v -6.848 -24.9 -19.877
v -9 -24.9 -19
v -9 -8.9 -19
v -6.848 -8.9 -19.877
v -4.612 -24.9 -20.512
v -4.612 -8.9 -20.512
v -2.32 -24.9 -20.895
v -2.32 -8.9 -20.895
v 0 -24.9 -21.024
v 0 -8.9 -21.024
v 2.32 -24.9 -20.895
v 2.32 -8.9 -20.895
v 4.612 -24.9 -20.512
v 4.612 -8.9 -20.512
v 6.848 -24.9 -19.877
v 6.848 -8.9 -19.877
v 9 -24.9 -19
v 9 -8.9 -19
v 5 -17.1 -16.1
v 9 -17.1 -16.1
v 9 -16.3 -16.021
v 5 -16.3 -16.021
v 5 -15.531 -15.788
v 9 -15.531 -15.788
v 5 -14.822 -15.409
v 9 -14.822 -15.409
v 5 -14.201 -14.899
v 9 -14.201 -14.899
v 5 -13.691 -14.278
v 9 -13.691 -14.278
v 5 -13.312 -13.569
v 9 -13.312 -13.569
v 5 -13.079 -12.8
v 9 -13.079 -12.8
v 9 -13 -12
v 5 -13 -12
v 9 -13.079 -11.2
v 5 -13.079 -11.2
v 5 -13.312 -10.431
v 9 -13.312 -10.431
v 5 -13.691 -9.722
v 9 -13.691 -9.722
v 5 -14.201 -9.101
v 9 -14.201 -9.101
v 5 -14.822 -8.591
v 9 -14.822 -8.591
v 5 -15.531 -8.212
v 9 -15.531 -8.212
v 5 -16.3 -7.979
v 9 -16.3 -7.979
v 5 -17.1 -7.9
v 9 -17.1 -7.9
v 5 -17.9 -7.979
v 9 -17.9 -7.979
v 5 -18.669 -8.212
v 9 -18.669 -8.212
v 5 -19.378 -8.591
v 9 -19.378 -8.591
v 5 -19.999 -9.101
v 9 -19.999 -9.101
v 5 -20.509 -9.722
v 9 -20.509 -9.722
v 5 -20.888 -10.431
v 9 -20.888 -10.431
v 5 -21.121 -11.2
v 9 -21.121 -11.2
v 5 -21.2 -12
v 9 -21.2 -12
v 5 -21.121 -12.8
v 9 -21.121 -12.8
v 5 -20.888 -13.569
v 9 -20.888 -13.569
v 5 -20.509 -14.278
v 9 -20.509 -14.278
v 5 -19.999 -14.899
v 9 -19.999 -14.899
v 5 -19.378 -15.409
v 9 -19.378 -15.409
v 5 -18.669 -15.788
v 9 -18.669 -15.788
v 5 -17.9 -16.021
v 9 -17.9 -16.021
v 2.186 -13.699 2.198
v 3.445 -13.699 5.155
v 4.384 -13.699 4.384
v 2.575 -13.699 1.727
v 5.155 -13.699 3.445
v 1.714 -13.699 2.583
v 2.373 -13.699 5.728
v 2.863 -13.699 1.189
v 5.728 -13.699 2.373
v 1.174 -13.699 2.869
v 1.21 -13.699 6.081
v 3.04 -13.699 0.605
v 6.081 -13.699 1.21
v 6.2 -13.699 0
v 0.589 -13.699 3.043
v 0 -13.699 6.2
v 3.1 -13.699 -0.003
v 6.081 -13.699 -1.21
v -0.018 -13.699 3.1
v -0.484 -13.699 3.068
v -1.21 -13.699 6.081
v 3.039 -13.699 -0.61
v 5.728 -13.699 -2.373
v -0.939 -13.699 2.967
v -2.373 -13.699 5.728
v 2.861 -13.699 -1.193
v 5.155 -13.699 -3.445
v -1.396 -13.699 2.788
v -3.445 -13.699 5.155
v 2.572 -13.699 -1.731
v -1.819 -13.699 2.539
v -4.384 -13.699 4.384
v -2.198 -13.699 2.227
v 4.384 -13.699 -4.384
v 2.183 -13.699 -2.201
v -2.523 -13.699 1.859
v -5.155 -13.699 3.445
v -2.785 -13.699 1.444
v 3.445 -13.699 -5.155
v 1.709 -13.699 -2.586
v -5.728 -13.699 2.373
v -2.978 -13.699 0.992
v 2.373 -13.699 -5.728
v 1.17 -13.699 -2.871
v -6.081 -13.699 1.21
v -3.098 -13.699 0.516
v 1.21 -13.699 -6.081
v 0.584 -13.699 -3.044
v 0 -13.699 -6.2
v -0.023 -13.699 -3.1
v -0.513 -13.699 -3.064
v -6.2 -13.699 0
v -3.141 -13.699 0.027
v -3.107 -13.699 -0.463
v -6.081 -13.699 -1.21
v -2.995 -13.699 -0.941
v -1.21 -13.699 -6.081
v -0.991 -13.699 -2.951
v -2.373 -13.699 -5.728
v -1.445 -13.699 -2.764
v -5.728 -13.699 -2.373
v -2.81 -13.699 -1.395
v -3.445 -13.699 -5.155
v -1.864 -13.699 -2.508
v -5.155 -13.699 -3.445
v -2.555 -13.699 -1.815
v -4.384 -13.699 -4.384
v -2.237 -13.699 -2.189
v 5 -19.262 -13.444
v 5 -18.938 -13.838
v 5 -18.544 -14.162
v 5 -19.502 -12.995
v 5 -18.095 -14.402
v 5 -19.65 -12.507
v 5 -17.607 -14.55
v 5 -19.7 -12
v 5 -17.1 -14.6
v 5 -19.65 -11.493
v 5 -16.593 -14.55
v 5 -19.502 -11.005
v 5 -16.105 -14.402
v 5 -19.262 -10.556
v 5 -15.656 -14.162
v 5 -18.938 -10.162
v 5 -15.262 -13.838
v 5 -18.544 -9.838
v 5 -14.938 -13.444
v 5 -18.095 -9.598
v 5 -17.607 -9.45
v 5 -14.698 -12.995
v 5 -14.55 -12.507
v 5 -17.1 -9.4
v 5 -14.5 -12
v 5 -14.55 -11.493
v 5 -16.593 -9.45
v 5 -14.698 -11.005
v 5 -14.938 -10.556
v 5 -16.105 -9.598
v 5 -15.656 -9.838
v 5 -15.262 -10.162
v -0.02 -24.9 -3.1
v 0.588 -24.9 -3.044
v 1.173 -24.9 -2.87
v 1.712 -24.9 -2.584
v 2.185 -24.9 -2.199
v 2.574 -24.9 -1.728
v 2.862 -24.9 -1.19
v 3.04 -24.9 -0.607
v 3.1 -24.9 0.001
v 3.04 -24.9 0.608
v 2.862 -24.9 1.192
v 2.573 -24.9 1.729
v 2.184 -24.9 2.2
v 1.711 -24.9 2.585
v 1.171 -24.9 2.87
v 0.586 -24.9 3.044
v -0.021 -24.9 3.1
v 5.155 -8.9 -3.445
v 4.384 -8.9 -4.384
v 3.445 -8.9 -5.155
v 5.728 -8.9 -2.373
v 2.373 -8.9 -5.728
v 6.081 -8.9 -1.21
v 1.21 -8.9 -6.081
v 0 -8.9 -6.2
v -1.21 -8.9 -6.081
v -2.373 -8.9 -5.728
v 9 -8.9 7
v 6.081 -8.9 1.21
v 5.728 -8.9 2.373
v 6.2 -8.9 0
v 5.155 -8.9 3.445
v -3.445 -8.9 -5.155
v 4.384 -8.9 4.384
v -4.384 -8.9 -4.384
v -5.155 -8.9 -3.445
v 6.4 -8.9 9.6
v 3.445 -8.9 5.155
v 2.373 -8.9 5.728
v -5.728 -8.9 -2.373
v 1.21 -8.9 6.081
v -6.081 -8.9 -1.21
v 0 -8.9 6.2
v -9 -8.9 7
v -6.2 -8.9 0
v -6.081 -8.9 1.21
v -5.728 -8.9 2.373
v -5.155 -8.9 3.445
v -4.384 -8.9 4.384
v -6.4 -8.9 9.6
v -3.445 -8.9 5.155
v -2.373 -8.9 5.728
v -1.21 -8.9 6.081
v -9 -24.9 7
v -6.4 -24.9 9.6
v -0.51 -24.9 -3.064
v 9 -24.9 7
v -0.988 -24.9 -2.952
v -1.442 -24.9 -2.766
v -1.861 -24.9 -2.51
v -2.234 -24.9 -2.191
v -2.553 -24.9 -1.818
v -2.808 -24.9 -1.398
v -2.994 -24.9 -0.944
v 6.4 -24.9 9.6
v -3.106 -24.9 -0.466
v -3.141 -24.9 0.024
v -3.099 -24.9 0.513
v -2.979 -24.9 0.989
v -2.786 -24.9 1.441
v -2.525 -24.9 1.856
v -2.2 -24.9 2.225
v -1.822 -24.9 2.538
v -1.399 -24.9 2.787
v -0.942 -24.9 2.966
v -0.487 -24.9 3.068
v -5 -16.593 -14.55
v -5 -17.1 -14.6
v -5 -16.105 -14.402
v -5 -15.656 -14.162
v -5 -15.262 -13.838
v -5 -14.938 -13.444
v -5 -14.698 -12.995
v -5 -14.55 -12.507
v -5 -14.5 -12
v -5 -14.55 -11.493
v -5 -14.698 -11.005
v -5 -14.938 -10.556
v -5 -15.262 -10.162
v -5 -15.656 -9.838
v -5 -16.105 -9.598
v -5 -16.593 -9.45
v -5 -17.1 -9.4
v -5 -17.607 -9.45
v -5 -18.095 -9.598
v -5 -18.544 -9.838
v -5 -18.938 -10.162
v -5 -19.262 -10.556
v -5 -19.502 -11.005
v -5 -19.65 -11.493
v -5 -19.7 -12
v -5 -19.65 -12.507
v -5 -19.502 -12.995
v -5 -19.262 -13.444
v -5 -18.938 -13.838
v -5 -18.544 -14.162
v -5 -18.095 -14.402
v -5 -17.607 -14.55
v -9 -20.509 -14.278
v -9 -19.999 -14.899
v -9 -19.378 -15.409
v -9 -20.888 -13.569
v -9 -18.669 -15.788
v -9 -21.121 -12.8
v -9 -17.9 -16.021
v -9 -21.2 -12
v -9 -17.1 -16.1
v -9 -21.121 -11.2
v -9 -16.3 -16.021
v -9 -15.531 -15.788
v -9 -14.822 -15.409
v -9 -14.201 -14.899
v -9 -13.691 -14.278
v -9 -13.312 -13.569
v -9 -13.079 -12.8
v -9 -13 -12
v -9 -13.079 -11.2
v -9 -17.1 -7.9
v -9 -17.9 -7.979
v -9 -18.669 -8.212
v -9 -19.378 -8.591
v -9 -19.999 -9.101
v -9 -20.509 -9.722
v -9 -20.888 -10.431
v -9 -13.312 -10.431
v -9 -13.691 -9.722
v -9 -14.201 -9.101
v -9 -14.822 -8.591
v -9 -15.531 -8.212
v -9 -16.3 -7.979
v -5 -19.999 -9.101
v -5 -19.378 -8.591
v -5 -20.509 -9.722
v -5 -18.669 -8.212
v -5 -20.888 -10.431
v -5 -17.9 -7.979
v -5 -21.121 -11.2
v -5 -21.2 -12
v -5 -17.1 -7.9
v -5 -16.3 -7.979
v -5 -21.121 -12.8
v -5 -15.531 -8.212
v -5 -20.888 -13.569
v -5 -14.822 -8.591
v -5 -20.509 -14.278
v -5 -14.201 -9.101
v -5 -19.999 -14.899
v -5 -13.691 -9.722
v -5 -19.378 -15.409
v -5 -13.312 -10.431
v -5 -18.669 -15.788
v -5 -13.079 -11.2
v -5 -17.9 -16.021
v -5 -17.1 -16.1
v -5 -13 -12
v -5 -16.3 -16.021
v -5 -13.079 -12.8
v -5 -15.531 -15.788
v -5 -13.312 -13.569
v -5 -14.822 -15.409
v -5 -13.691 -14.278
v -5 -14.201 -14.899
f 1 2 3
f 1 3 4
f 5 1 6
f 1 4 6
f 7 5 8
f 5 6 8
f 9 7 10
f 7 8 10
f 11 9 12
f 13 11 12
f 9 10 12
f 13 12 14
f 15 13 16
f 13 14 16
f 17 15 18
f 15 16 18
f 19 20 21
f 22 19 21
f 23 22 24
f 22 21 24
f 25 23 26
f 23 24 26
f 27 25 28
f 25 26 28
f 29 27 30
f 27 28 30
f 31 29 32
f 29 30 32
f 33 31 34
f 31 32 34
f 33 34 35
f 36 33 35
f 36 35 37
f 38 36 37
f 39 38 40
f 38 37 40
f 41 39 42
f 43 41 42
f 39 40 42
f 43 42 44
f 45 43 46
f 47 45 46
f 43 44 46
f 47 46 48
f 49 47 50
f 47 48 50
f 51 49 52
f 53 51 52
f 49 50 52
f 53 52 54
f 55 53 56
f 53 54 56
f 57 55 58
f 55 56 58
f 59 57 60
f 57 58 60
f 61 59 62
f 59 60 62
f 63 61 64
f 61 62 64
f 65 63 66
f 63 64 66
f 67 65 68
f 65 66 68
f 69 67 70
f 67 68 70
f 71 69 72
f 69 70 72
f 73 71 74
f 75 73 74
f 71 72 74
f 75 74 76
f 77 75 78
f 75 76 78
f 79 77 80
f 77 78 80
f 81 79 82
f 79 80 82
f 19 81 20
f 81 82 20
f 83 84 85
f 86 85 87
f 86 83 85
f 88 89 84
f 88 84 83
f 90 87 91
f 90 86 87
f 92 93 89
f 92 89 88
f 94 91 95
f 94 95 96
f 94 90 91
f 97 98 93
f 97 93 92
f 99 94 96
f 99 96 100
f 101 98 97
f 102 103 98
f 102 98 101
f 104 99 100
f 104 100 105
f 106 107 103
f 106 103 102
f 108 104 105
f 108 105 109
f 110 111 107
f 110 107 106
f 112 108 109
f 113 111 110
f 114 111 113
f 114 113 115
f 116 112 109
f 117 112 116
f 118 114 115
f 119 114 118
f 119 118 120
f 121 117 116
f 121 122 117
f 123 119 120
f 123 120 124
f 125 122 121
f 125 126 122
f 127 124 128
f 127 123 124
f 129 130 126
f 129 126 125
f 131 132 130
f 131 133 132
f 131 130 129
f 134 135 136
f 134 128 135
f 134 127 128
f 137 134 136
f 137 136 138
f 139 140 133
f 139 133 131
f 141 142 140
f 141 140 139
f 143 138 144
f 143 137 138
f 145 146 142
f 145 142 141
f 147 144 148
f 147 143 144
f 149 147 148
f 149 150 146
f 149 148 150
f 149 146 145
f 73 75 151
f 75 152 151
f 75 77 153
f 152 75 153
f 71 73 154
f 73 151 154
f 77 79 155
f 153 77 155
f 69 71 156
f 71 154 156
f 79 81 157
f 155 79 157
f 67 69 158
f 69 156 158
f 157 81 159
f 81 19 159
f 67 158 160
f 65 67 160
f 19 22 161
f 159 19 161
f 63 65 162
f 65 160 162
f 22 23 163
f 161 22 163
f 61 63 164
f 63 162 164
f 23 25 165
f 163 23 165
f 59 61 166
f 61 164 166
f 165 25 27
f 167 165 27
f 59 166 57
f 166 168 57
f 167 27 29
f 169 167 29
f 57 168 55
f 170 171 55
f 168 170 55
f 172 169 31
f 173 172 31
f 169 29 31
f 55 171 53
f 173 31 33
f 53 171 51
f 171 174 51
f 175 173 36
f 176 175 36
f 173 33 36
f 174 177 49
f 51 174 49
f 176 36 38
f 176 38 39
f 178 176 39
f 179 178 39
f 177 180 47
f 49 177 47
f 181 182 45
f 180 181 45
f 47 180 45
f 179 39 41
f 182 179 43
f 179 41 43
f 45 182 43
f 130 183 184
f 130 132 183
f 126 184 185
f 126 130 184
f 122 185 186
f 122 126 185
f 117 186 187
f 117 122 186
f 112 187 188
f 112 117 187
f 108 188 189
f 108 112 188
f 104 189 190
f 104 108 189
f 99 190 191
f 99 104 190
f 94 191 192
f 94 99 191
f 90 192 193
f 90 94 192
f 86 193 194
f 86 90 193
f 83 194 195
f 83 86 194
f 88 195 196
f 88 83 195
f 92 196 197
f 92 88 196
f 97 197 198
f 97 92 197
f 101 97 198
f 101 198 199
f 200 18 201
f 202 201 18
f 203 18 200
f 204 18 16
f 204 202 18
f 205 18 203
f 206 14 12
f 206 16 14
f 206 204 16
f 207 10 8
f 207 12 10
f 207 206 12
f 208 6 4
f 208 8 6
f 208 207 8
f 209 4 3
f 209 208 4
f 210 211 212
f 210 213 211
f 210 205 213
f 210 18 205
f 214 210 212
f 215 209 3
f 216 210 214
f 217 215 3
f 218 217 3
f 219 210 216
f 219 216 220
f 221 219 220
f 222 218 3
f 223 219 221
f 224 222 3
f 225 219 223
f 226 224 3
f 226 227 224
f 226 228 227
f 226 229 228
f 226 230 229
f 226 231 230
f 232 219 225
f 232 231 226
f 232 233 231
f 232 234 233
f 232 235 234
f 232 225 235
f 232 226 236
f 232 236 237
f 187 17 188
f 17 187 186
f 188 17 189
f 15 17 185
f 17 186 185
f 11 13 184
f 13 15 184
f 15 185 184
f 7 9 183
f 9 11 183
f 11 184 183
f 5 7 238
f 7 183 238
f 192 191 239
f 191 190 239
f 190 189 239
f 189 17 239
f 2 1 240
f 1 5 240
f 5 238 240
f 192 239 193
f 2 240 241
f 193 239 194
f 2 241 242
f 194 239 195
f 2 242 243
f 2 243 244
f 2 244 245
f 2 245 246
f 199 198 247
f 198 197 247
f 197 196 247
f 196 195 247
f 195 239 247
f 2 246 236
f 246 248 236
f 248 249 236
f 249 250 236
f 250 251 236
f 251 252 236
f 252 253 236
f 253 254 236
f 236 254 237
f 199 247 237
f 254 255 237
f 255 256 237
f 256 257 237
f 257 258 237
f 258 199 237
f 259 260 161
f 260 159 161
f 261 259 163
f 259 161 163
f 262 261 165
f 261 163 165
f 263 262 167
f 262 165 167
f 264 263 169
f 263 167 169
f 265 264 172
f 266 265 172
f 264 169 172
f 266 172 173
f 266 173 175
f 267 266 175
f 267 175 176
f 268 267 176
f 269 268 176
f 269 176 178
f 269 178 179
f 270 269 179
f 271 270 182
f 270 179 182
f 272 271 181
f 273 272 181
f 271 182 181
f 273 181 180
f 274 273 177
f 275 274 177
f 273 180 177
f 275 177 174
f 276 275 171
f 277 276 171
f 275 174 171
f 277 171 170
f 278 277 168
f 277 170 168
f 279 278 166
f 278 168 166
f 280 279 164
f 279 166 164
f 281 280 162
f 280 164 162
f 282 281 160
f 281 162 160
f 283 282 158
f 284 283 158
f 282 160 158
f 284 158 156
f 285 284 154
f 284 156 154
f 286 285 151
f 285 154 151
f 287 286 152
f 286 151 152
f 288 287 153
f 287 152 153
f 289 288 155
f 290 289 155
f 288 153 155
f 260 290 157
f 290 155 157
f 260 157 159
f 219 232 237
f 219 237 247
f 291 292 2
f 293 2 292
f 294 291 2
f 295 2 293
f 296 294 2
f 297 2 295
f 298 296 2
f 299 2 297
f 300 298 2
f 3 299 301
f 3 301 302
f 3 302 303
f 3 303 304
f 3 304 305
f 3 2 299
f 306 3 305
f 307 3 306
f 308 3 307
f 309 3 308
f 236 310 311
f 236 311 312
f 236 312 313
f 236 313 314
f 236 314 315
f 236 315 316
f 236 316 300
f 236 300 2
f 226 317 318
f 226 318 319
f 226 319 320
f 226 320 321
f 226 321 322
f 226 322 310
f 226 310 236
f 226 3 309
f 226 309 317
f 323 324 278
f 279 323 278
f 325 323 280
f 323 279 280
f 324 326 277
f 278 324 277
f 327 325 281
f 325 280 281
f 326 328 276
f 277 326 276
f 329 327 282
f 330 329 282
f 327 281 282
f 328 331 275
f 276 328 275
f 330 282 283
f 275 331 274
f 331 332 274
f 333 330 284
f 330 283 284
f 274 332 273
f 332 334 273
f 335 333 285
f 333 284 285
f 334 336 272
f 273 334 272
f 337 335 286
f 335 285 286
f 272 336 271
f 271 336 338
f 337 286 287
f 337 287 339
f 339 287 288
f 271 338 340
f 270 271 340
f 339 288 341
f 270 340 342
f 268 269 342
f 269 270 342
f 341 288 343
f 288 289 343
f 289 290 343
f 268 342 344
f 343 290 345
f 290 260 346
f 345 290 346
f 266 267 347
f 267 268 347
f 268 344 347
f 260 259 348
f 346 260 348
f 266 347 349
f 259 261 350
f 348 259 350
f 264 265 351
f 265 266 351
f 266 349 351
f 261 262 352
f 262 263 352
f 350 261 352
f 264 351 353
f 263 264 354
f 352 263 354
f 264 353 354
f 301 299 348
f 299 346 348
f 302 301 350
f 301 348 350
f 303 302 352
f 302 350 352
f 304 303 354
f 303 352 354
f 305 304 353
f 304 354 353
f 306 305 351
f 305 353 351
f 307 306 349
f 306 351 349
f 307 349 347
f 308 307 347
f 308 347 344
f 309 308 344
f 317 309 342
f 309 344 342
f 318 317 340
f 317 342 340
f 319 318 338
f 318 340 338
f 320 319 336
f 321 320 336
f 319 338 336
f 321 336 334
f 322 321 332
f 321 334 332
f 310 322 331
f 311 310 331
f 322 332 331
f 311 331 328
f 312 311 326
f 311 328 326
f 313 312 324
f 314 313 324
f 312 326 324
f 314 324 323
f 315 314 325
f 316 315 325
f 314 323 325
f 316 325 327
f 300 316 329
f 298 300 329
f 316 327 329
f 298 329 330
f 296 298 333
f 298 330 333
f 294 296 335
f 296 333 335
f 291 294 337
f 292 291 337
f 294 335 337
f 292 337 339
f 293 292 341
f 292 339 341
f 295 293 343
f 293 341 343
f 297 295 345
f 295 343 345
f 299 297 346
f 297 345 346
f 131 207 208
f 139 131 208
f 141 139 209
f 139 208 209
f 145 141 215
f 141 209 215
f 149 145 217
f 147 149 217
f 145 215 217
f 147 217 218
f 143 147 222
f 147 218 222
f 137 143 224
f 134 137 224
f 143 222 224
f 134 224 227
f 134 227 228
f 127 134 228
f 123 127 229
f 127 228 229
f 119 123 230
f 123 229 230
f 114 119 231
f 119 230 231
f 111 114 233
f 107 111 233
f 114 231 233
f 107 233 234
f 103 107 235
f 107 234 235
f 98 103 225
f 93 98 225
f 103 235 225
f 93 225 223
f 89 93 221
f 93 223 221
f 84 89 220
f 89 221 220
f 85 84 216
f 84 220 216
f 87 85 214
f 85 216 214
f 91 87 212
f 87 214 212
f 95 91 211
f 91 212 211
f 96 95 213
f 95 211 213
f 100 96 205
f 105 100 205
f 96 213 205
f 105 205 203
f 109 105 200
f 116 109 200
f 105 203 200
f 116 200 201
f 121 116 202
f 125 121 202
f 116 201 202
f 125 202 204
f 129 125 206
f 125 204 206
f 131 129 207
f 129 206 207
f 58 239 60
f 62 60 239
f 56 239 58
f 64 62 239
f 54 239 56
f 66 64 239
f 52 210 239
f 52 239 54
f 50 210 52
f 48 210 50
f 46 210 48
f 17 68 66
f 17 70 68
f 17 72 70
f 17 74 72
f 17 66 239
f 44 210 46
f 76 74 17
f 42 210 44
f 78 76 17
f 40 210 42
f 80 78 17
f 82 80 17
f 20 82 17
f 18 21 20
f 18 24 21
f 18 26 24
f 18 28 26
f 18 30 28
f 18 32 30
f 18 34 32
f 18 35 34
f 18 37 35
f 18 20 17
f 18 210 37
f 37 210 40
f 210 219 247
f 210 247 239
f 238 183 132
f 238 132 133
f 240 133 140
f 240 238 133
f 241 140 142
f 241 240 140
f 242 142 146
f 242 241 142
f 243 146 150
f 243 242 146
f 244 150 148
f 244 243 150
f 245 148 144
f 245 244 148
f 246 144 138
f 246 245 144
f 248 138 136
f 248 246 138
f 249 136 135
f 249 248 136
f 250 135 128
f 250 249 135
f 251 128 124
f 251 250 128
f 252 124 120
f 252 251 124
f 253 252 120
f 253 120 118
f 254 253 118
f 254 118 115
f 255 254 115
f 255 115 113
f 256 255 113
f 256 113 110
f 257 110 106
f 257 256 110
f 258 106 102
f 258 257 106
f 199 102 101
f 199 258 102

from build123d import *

# Parameters (mm, degrees)
COPYSKETCH018_W             = 6.8
COPYSKETCH018_H             = 3.7
CYLINDER069_R               = 3.1
CYLINDER069_DEPTH           = 44
CYLINDER069_ROLL_ANGLE      = -89.999777
CYLINDER069_PITCH_ANGLE     = -2.5e-05
CYLINDER069_PLACEMENT_ANGLE = 7.5e-05
SKETCH022_R                 = 3.1
PAD022_DEPTH                = 16


with BuildPart() as abstand_ring004:
    # CopySketch018 → Revolution004 (revolve)
    with BuildSketch(Plane.YZ):
        with Locations((-5.899207, -4.35)):
            Rectangle(COPYSKETCH018_W, COPYSKETCH018_H)
    revolve(axis=Axis((0, 0, 0), (0, 1, 0)))


with BuildPart() as abstand_ring004_1:
    # Body032 placement: moved
    add(abstand_ring004.part.moved(Location((0, -4.4, 0))))


with BuildPart() as bohrung_durch_innen:
    # Cylinder069 → Cylinder069 (new body)
    with BuildSketch(Plane.XY):
        Circle(CYLINDER069_R)
    extrude(amount=CYLINDER069_DEPTH)


with BuildPart() as bohrung_durch_innen_1:
    # Cylinder069 roll: moved
    add(bohrung_durch_innen.part.rotate(Axis((0, 0, 0), (1, 0, 0)), CYLINDER069_ROLL_ANGLE))


with BuildPart() as bohrung_durch_innen_2:
    # Cylinder069 pitch: moved
    add(bohrung_durch_innen_1.part.rotate(Axis((0, 0, 0), (0, 1, 0)), CYLINDER069_PITCH_ANGLE))


with BuildPart() as bohrung_durch_innen_3:
    # Cylinder069 placement: moved
    add(bohrung_durch_innen_2.part.moved(Location((-0.041441, -44.040796, -8.4e-05))).rotate(Axis((-0.041441, -44.040796, -8.4e-05), (0, 0, 1)), CYLINDER069_PLACEMENT_ANGLE))


with BuildPart() as schwinge_bohung_innen:
    # Sketch023 → Revolution (revolve)
    with BuildSketch(Plane.XZ):
        Polygon((-12.204835, 0), (-12.204835, -4.1), (-5, -4.1), (-5, -2.6), (5, -2.6), (5, -4.1), (12.102632, -4.1), (12.102632, 0), align=None)
    revolve(axis=Axis((0, 0, 0), (1, 0, 0)))


with BuildPart() as schwinge_bohung_innen_1:
    # Body033 placement: moved
    add(schwinge_bohung_innen.part.moved(Location((0, -17.1, -12))))


with BuildPart() as cut064:
    # Sketch022 → Pad022 (new body)
    with BuildSketch(Plane.XZ):
        with BuildLine():
            Line((-9, 7), (-6.4, 9.6))
            Line((-6.4, 9.6), (6.4, 9.6))
            Line((6.4, 9.6), (9, 7))
            Line((9, 7), (9, -19))
            ThreePointArc((-9, -19), (0, -21.023796), (9, -19))
            Line((-9, -19), (-9, 7))
        make_face()
        Circle(SKETCH022_R, mode=Mode.SUBTRACT)
    extrude(amount=PAD022_DEPTH)


with BuildPart() as cut064_1:
    # Body031 placement: moved
    add(cut064.part.moved(Location((0, -8.9, 0))))

    # Cut062: cut schwinge-bohung-innen
    add(schwinge_bohung_innen_1.part, mode=Mode.SUBTRACT)

    # Cut063: cut bohrung-durch-innen
    add(bohrung_durch_innen_3.part, mode=Mode.SUBTRACT)

    # Cut064: cut abstand-ring004
    add(abstand_ring004_1.part, mode=Mode.SUBTRACT)


solid = cut064_1.part
